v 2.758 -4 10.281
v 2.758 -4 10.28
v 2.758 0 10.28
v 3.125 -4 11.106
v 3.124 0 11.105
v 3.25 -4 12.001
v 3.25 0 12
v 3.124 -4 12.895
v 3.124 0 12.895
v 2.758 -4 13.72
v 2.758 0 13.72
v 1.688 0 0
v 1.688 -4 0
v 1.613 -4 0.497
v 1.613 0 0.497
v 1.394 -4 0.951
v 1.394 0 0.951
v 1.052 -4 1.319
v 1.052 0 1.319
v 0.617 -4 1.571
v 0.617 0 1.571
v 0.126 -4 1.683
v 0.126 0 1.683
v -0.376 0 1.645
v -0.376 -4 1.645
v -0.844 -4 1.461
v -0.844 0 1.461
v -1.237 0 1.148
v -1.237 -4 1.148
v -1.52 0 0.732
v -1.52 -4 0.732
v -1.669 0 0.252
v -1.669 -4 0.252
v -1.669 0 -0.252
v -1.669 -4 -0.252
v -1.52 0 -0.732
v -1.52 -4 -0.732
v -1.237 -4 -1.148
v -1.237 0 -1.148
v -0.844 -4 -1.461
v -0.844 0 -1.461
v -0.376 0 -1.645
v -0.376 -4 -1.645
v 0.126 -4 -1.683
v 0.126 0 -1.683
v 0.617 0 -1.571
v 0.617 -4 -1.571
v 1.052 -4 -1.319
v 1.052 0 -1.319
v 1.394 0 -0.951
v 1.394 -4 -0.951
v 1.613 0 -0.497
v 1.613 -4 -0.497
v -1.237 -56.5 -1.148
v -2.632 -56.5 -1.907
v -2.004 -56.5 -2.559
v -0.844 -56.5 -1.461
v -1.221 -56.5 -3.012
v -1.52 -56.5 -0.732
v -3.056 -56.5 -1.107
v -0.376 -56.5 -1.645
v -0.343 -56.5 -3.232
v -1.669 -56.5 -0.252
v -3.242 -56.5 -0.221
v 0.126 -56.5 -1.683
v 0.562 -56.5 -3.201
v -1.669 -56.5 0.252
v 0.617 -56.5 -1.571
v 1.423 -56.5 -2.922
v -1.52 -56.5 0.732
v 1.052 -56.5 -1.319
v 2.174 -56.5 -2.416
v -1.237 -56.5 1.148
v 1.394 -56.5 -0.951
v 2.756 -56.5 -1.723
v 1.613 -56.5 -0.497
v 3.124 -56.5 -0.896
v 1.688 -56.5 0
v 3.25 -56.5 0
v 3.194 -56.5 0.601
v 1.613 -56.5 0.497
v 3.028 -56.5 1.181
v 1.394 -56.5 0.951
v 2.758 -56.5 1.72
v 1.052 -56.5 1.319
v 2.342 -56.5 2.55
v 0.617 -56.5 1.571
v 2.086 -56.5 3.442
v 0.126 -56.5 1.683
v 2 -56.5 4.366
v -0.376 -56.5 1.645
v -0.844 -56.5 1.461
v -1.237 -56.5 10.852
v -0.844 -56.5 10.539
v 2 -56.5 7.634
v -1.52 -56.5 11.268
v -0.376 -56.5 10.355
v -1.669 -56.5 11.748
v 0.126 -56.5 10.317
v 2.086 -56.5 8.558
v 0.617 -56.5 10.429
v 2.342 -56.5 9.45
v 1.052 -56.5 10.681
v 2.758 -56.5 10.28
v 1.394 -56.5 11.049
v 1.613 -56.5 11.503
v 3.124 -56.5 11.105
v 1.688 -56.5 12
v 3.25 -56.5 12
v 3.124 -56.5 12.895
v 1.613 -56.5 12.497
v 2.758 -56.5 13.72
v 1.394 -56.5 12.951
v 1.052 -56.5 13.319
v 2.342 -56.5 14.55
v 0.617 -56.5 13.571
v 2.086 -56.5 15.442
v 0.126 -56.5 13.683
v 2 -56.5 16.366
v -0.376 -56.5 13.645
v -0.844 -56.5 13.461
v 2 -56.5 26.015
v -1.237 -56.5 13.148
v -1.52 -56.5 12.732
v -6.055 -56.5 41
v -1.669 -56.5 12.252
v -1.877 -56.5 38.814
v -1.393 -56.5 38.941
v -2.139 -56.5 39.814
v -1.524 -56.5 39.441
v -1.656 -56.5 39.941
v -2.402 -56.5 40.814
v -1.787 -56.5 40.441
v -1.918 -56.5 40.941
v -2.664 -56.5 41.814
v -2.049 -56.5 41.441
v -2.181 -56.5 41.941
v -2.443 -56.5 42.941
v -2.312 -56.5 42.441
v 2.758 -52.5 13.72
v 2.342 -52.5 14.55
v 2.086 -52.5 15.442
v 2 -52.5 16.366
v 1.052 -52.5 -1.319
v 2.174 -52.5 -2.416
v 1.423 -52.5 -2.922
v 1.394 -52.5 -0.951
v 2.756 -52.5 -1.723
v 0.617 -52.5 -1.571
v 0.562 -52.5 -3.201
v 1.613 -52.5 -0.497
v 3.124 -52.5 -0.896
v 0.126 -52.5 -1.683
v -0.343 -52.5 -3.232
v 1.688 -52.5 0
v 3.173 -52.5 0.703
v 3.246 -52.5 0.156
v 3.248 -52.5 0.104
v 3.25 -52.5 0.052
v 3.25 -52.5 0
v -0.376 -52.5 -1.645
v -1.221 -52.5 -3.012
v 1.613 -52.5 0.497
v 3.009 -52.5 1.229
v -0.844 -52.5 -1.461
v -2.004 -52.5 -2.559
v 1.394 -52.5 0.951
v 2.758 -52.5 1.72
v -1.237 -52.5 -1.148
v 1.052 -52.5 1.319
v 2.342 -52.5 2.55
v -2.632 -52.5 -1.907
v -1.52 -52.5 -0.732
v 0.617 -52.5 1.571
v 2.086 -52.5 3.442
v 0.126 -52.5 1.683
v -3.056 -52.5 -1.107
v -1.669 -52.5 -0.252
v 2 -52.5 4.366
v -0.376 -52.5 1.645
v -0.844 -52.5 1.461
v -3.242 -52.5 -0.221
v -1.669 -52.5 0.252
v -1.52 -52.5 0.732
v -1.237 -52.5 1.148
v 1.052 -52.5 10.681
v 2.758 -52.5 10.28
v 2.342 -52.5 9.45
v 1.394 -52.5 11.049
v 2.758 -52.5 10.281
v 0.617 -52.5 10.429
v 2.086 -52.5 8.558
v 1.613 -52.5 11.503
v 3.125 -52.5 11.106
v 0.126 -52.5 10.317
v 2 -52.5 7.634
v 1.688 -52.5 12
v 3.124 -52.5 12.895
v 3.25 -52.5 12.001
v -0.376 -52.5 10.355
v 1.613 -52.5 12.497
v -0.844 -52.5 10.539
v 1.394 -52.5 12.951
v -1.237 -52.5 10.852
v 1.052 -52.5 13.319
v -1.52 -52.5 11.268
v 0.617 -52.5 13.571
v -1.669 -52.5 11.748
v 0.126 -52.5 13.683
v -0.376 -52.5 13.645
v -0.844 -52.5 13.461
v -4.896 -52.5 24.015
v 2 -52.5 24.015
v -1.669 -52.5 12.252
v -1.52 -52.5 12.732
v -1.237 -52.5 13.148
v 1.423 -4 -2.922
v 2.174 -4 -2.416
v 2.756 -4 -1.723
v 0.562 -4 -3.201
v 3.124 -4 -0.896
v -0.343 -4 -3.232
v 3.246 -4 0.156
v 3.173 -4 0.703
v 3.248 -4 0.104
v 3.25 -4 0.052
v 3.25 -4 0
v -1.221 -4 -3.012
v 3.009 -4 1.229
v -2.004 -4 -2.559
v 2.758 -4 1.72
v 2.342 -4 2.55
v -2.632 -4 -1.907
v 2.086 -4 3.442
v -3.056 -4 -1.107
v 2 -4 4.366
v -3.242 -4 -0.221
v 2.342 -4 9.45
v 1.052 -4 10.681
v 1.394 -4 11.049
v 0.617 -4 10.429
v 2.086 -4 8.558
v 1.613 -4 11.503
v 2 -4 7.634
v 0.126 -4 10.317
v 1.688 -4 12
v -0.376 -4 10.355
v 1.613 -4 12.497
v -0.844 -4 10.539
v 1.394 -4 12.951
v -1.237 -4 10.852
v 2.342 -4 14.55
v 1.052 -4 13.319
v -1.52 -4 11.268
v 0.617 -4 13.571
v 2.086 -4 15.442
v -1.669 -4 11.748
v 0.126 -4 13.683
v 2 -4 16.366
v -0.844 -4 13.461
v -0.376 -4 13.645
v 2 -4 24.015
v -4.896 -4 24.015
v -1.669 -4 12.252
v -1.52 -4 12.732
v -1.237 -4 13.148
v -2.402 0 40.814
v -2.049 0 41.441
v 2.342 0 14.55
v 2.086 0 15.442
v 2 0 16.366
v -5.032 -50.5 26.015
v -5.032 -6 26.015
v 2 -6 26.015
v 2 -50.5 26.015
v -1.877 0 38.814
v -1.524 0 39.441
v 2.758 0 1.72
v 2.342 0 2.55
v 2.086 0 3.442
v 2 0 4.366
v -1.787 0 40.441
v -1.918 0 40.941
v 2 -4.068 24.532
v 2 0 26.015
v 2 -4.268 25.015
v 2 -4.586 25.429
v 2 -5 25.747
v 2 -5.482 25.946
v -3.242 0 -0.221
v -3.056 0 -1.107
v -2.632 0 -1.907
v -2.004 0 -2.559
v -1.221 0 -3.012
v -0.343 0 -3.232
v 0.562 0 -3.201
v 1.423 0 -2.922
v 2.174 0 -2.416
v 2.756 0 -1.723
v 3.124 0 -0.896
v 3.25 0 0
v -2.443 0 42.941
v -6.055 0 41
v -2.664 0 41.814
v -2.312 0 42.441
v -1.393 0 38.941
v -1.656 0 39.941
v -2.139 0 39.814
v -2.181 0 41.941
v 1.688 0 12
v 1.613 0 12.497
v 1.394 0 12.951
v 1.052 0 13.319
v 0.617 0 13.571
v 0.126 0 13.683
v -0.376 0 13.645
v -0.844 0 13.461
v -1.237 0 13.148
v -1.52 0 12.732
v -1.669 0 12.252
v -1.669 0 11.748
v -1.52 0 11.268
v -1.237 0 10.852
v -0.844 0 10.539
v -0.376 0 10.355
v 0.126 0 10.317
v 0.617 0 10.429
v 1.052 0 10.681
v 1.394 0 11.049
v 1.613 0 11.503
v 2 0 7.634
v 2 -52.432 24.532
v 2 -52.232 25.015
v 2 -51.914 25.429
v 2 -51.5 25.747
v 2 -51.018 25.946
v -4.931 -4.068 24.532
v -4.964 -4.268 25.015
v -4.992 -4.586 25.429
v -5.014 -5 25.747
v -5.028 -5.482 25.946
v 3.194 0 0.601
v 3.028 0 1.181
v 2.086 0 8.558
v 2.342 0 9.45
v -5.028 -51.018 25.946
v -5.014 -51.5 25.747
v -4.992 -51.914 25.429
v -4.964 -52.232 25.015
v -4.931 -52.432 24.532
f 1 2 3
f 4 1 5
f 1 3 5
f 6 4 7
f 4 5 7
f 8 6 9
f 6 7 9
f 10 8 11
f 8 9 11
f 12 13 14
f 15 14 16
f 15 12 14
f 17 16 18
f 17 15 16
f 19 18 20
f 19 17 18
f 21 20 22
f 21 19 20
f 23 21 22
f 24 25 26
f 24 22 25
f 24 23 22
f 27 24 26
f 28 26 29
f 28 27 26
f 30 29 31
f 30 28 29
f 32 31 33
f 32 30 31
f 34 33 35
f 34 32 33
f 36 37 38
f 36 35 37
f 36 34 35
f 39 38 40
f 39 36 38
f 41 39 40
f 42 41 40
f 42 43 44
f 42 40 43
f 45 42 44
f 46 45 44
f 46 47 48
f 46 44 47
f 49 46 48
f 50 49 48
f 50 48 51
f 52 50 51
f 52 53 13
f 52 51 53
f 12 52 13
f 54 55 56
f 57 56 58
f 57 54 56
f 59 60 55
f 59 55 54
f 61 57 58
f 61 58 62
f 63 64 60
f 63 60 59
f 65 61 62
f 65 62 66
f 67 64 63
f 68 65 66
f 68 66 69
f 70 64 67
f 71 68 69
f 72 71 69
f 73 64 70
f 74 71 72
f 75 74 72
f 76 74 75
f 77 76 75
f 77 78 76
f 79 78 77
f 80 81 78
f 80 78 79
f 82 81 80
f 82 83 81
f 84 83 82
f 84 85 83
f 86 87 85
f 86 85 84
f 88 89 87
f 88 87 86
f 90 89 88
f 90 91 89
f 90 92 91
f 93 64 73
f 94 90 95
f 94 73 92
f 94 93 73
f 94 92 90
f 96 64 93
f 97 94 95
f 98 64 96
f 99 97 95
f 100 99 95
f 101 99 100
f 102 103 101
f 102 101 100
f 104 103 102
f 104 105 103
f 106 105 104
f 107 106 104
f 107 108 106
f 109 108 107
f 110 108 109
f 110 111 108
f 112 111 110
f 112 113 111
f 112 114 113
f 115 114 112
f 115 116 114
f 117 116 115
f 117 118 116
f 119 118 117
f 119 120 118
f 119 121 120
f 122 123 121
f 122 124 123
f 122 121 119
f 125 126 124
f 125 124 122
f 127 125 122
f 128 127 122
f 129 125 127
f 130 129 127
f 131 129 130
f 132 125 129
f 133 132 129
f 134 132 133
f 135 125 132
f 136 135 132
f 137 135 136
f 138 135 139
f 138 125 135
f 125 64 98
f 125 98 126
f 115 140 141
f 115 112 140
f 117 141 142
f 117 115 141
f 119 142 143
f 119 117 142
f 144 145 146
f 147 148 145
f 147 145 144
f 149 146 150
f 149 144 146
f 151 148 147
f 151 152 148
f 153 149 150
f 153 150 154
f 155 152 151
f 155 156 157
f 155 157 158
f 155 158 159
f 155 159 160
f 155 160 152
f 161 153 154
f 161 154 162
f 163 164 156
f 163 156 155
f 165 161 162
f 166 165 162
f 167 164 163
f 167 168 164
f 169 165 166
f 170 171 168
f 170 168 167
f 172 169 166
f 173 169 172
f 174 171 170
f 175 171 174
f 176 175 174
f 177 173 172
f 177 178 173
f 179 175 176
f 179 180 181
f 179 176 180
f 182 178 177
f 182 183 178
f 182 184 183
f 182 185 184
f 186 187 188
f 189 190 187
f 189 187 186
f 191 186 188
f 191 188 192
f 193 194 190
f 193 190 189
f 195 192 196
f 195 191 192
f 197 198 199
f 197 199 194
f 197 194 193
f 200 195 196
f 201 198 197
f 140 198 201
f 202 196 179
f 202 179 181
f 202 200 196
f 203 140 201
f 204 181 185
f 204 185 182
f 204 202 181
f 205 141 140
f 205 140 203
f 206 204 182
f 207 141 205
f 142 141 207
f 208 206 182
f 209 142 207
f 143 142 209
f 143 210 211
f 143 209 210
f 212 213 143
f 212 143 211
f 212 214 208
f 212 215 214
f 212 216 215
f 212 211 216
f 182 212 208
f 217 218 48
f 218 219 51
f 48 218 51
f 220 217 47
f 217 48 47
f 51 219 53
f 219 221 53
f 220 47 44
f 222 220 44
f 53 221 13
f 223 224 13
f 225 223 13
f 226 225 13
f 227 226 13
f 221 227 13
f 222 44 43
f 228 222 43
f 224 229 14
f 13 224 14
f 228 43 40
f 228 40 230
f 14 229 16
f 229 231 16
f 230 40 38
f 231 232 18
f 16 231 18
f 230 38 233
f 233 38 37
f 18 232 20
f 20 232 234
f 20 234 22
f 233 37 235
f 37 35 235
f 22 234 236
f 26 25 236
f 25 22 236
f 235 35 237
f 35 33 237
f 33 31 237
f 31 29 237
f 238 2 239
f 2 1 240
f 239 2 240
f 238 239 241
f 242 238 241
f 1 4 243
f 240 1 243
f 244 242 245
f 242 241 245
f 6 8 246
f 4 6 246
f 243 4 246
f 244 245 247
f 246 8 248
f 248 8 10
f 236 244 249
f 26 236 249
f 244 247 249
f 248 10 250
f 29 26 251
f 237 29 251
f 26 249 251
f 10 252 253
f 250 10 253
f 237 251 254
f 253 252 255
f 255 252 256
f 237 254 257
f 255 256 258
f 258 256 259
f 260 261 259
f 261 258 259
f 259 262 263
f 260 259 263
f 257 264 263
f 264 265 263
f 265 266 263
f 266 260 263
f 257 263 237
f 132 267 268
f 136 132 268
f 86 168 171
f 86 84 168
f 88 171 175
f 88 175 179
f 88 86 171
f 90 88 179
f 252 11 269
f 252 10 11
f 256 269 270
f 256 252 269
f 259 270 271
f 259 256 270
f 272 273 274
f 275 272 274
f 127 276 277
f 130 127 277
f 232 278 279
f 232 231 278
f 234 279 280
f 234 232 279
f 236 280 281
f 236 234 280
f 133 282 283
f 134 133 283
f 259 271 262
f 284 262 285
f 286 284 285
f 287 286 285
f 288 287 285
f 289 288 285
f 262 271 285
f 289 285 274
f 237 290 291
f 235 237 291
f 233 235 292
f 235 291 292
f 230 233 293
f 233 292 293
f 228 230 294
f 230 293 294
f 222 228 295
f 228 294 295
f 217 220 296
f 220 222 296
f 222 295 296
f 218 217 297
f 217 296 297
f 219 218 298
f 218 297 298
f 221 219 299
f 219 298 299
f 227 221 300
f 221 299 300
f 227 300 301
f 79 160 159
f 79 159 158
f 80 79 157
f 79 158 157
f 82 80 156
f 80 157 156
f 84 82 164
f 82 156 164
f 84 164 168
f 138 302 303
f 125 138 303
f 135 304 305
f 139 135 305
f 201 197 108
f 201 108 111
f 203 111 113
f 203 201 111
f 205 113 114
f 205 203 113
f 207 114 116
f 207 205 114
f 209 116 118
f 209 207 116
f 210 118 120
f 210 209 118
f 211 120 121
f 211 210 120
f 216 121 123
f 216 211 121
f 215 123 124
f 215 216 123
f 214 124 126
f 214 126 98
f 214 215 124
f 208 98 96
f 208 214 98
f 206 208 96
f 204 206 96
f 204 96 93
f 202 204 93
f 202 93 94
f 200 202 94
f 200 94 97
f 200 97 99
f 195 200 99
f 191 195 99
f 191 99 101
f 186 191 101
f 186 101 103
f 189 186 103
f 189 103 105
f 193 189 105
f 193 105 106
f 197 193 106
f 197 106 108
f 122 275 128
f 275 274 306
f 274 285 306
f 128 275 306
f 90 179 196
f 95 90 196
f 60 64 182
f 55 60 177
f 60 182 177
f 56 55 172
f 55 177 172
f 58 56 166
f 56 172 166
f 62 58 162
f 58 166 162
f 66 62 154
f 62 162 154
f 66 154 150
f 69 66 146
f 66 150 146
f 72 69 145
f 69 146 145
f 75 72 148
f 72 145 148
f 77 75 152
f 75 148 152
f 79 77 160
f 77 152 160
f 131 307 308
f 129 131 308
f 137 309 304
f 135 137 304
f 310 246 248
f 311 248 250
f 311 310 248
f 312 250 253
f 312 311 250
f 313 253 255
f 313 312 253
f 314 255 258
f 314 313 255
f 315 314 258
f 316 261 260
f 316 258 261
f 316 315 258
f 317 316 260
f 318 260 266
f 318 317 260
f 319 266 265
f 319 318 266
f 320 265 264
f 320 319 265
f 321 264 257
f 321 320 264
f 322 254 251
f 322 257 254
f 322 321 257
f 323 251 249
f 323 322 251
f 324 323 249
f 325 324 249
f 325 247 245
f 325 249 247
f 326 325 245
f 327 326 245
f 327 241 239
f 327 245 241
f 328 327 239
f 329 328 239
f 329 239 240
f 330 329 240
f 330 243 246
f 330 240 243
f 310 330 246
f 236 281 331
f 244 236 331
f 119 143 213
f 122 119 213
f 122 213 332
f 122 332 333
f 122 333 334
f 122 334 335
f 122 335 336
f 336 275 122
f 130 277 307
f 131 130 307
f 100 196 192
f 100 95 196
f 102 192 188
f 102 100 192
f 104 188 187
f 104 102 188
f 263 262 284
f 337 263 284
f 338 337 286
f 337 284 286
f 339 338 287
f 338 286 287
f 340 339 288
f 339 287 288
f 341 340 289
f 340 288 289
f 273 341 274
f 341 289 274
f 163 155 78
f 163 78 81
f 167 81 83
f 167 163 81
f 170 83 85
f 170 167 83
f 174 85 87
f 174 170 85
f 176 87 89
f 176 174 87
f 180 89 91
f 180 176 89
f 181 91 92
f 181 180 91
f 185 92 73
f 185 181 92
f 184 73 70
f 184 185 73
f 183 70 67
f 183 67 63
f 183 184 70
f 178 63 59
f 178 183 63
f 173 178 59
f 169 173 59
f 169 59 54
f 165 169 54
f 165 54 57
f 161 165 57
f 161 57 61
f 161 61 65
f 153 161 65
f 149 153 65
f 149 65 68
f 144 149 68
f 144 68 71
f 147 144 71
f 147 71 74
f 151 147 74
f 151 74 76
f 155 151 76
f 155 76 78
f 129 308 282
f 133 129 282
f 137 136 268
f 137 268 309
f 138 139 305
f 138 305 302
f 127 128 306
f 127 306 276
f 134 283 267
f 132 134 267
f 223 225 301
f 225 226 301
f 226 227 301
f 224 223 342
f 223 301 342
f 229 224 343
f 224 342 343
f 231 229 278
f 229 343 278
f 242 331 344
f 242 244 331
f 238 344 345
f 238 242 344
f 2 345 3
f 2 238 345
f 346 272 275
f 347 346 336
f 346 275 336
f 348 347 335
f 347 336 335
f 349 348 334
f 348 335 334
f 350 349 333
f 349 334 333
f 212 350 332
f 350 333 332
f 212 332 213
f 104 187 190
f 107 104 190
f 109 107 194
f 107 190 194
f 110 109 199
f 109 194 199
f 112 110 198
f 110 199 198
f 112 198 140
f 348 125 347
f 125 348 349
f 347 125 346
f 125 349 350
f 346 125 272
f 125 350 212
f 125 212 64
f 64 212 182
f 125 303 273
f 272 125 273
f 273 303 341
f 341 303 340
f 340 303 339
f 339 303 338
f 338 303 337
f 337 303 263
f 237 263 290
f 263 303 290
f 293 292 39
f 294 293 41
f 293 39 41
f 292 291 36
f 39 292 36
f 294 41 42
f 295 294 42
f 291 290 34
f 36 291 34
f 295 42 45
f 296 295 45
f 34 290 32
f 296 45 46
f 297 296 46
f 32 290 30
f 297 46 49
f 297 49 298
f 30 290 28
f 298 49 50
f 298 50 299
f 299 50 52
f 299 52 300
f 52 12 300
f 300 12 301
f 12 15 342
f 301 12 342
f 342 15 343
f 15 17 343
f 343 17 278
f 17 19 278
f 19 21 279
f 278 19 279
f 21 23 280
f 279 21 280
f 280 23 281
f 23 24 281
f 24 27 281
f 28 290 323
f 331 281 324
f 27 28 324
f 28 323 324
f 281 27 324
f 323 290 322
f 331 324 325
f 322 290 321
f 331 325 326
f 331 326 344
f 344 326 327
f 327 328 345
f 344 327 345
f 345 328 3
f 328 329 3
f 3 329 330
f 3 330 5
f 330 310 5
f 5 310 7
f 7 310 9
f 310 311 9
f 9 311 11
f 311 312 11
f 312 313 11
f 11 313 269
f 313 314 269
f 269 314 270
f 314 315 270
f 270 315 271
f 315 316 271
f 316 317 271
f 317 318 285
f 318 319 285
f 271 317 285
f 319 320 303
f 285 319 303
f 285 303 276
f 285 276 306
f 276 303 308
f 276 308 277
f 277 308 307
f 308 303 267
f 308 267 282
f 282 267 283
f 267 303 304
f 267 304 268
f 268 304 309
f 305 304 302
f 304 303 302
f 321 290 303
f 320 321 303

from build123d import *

# Parameters (mm, degrees)
F0_R     = 1.6875
F0_R_2   = 2
F1_DEPTH = 56.5
F3_START = -4
F3_DEPTH = 48.5
F5_R     = 5
F6_R     = 2


# Not quite as in the source:
# - a feature of the source that left no trace in its solid (it failed there, or was rolled back) is left out
# - a feature names something its author has since deleted; it is built from what else it names


with BuildPart() as f1:
    # F0 (on Front) → F1 (new body)
    with BuildSketch(Plane.XZ):
        with BuildLine():
            ThreePointArc((-3.2424633134, -0.2212050215), (-1.5238508153, 2.8706059801), (2, 2.5617376915))
            Line((2, 2.5617376915), (2, 9.4382623085))
            ThreePointArc((2, 9.4382623085), (3.25, 12), (2, 14.5617376915))
            Line((2, 14.5617376915), (2, 16))
            Line((2, 16), (2, 26.0145742767))
            Line((2, 26.0145742767), (-1.3932364987, 38.9411094094))
            Line((-1.3932364987, 38.9411094094), (-1.8768517883, 38.8141596092))
            Line((-1.8768517883, 38.8141596092), (-1.5244873121, 39.4411094094))
            Line((-1.5244873121, 39.4411094094), (-1.6557381254, 39.9411094094))
            Line((-1.6557381254, 39.9411094094), (-2.1393534149, 39.8141596092))
            Line((-2.1393534149, 39.8141596092), (-1.7869889387, 40.4411094094))
            Line((-1.7869889387, 40.4411094094), (-1.918239752, 40.9411094094))
            Line((-1.918239752, 40.9411094094), (-2.4018550415, 40.8141596092))
            Line((-2.4018550415, 40.8141596092), (-2.0494905653, 41.4411094094))
            Line((-2.0494905653, 41.4411094094), (-2.1807413786, 41.9411094094))
            Line((-2.1807413786, 41.9411094094), (-2.6643566681, 41.8141596092))
            Line((-2.6643566681, 41.8141596092), (-2.3119921919, 42.4411094094))
            Line((-2.3119921919, 42.4411094094), (-2.4432430052, 42.9411094094))
            Line((-2.4432430052, 42.9411094094), (-6.0546269865, 41))
            Line((-6.0546269865, 41), (-3.2424633134, -0.2212050215))
        make_face()
        with Locations((0, 12)):
            Circle(F0_R, mode=Mode.SUBTRACT)
        with BuildLine():
            ThreePointArc((3.25, 0), (2.9208303614, 1.4252192814), (2, 2.5617376915))
            ThreePointArc((2, 2.5617376915), (-1.5238508153, 2.8706059801), (-3.2424633134, -0.2212050215))
            ThreePointArc((-3.2424633134, -0.2212050215), (0.1106666878, -3.2481152819), (3.25, 0))
        make_face()
        Circle(F0_R_2, mode=Mode.SUBTRACT)
        Circle(F0_R_2)
        Circle(F0_R, mode=Mode.SUBTRACT)
    extrude(amount=F1_DEPTH)

    # F2 (on face) → F3 (cut)
    with BuildSketch(Plane(origin=(0, 0, 0), x_dir=(-1, 0, 0), z_dir=(0, 1, 0)).offset(F3_START)):
        with BuildLine():
            Line((5.032301952, 26.0145742767), (-2, 26.0145742767))
            Line((-2, 26.0145742767), (-2.5801925668, 13.9761341853))
            ThreePointArc((-2.5801925668, 13.9761341853), (-3.2462320816, 12.1564521408), (-2.7582721639, 10.2811530987))
            Line((-2.7582721639, 10.2811530987), (-3.2462320816, 0.1564521408))
            ThreePointArc((-3.2462320816, 0.1564521408), (-0.1888379833, -3.2445092412), (3.2424633134, -0.2212050215))
            Line((3.2424633134, -0.2212050215), (5.032301952, 26.0145742767))
        make_face()
    extrude(amount=-F3_DEPTH, mode=Mode.SUBTRACT)

    # F5
    f5_edges = [f1.edges().sort_by_distance(p)[0] for p in [
        (2, -2, 9.438262),
        (2, -54.5, 9.438262),
        (2, -2, 2.561738),
        (2, -2, 14.561738),
        (2, -54.5, 14.561738),
        (2, -54.5, 2.561738),
    ]]
    fillet(f5_edges, radius=F5_R)

    # F6
    f6_edges = [f1.edges().sort_by_distance(p)[0] for p in [
        (-1.516151, -52.5, 26.014574),
        (-1.516151, -4, 26.014574),
    ]]
    fillet(f6_edges, radius=F6_R)


solid = f1.part
